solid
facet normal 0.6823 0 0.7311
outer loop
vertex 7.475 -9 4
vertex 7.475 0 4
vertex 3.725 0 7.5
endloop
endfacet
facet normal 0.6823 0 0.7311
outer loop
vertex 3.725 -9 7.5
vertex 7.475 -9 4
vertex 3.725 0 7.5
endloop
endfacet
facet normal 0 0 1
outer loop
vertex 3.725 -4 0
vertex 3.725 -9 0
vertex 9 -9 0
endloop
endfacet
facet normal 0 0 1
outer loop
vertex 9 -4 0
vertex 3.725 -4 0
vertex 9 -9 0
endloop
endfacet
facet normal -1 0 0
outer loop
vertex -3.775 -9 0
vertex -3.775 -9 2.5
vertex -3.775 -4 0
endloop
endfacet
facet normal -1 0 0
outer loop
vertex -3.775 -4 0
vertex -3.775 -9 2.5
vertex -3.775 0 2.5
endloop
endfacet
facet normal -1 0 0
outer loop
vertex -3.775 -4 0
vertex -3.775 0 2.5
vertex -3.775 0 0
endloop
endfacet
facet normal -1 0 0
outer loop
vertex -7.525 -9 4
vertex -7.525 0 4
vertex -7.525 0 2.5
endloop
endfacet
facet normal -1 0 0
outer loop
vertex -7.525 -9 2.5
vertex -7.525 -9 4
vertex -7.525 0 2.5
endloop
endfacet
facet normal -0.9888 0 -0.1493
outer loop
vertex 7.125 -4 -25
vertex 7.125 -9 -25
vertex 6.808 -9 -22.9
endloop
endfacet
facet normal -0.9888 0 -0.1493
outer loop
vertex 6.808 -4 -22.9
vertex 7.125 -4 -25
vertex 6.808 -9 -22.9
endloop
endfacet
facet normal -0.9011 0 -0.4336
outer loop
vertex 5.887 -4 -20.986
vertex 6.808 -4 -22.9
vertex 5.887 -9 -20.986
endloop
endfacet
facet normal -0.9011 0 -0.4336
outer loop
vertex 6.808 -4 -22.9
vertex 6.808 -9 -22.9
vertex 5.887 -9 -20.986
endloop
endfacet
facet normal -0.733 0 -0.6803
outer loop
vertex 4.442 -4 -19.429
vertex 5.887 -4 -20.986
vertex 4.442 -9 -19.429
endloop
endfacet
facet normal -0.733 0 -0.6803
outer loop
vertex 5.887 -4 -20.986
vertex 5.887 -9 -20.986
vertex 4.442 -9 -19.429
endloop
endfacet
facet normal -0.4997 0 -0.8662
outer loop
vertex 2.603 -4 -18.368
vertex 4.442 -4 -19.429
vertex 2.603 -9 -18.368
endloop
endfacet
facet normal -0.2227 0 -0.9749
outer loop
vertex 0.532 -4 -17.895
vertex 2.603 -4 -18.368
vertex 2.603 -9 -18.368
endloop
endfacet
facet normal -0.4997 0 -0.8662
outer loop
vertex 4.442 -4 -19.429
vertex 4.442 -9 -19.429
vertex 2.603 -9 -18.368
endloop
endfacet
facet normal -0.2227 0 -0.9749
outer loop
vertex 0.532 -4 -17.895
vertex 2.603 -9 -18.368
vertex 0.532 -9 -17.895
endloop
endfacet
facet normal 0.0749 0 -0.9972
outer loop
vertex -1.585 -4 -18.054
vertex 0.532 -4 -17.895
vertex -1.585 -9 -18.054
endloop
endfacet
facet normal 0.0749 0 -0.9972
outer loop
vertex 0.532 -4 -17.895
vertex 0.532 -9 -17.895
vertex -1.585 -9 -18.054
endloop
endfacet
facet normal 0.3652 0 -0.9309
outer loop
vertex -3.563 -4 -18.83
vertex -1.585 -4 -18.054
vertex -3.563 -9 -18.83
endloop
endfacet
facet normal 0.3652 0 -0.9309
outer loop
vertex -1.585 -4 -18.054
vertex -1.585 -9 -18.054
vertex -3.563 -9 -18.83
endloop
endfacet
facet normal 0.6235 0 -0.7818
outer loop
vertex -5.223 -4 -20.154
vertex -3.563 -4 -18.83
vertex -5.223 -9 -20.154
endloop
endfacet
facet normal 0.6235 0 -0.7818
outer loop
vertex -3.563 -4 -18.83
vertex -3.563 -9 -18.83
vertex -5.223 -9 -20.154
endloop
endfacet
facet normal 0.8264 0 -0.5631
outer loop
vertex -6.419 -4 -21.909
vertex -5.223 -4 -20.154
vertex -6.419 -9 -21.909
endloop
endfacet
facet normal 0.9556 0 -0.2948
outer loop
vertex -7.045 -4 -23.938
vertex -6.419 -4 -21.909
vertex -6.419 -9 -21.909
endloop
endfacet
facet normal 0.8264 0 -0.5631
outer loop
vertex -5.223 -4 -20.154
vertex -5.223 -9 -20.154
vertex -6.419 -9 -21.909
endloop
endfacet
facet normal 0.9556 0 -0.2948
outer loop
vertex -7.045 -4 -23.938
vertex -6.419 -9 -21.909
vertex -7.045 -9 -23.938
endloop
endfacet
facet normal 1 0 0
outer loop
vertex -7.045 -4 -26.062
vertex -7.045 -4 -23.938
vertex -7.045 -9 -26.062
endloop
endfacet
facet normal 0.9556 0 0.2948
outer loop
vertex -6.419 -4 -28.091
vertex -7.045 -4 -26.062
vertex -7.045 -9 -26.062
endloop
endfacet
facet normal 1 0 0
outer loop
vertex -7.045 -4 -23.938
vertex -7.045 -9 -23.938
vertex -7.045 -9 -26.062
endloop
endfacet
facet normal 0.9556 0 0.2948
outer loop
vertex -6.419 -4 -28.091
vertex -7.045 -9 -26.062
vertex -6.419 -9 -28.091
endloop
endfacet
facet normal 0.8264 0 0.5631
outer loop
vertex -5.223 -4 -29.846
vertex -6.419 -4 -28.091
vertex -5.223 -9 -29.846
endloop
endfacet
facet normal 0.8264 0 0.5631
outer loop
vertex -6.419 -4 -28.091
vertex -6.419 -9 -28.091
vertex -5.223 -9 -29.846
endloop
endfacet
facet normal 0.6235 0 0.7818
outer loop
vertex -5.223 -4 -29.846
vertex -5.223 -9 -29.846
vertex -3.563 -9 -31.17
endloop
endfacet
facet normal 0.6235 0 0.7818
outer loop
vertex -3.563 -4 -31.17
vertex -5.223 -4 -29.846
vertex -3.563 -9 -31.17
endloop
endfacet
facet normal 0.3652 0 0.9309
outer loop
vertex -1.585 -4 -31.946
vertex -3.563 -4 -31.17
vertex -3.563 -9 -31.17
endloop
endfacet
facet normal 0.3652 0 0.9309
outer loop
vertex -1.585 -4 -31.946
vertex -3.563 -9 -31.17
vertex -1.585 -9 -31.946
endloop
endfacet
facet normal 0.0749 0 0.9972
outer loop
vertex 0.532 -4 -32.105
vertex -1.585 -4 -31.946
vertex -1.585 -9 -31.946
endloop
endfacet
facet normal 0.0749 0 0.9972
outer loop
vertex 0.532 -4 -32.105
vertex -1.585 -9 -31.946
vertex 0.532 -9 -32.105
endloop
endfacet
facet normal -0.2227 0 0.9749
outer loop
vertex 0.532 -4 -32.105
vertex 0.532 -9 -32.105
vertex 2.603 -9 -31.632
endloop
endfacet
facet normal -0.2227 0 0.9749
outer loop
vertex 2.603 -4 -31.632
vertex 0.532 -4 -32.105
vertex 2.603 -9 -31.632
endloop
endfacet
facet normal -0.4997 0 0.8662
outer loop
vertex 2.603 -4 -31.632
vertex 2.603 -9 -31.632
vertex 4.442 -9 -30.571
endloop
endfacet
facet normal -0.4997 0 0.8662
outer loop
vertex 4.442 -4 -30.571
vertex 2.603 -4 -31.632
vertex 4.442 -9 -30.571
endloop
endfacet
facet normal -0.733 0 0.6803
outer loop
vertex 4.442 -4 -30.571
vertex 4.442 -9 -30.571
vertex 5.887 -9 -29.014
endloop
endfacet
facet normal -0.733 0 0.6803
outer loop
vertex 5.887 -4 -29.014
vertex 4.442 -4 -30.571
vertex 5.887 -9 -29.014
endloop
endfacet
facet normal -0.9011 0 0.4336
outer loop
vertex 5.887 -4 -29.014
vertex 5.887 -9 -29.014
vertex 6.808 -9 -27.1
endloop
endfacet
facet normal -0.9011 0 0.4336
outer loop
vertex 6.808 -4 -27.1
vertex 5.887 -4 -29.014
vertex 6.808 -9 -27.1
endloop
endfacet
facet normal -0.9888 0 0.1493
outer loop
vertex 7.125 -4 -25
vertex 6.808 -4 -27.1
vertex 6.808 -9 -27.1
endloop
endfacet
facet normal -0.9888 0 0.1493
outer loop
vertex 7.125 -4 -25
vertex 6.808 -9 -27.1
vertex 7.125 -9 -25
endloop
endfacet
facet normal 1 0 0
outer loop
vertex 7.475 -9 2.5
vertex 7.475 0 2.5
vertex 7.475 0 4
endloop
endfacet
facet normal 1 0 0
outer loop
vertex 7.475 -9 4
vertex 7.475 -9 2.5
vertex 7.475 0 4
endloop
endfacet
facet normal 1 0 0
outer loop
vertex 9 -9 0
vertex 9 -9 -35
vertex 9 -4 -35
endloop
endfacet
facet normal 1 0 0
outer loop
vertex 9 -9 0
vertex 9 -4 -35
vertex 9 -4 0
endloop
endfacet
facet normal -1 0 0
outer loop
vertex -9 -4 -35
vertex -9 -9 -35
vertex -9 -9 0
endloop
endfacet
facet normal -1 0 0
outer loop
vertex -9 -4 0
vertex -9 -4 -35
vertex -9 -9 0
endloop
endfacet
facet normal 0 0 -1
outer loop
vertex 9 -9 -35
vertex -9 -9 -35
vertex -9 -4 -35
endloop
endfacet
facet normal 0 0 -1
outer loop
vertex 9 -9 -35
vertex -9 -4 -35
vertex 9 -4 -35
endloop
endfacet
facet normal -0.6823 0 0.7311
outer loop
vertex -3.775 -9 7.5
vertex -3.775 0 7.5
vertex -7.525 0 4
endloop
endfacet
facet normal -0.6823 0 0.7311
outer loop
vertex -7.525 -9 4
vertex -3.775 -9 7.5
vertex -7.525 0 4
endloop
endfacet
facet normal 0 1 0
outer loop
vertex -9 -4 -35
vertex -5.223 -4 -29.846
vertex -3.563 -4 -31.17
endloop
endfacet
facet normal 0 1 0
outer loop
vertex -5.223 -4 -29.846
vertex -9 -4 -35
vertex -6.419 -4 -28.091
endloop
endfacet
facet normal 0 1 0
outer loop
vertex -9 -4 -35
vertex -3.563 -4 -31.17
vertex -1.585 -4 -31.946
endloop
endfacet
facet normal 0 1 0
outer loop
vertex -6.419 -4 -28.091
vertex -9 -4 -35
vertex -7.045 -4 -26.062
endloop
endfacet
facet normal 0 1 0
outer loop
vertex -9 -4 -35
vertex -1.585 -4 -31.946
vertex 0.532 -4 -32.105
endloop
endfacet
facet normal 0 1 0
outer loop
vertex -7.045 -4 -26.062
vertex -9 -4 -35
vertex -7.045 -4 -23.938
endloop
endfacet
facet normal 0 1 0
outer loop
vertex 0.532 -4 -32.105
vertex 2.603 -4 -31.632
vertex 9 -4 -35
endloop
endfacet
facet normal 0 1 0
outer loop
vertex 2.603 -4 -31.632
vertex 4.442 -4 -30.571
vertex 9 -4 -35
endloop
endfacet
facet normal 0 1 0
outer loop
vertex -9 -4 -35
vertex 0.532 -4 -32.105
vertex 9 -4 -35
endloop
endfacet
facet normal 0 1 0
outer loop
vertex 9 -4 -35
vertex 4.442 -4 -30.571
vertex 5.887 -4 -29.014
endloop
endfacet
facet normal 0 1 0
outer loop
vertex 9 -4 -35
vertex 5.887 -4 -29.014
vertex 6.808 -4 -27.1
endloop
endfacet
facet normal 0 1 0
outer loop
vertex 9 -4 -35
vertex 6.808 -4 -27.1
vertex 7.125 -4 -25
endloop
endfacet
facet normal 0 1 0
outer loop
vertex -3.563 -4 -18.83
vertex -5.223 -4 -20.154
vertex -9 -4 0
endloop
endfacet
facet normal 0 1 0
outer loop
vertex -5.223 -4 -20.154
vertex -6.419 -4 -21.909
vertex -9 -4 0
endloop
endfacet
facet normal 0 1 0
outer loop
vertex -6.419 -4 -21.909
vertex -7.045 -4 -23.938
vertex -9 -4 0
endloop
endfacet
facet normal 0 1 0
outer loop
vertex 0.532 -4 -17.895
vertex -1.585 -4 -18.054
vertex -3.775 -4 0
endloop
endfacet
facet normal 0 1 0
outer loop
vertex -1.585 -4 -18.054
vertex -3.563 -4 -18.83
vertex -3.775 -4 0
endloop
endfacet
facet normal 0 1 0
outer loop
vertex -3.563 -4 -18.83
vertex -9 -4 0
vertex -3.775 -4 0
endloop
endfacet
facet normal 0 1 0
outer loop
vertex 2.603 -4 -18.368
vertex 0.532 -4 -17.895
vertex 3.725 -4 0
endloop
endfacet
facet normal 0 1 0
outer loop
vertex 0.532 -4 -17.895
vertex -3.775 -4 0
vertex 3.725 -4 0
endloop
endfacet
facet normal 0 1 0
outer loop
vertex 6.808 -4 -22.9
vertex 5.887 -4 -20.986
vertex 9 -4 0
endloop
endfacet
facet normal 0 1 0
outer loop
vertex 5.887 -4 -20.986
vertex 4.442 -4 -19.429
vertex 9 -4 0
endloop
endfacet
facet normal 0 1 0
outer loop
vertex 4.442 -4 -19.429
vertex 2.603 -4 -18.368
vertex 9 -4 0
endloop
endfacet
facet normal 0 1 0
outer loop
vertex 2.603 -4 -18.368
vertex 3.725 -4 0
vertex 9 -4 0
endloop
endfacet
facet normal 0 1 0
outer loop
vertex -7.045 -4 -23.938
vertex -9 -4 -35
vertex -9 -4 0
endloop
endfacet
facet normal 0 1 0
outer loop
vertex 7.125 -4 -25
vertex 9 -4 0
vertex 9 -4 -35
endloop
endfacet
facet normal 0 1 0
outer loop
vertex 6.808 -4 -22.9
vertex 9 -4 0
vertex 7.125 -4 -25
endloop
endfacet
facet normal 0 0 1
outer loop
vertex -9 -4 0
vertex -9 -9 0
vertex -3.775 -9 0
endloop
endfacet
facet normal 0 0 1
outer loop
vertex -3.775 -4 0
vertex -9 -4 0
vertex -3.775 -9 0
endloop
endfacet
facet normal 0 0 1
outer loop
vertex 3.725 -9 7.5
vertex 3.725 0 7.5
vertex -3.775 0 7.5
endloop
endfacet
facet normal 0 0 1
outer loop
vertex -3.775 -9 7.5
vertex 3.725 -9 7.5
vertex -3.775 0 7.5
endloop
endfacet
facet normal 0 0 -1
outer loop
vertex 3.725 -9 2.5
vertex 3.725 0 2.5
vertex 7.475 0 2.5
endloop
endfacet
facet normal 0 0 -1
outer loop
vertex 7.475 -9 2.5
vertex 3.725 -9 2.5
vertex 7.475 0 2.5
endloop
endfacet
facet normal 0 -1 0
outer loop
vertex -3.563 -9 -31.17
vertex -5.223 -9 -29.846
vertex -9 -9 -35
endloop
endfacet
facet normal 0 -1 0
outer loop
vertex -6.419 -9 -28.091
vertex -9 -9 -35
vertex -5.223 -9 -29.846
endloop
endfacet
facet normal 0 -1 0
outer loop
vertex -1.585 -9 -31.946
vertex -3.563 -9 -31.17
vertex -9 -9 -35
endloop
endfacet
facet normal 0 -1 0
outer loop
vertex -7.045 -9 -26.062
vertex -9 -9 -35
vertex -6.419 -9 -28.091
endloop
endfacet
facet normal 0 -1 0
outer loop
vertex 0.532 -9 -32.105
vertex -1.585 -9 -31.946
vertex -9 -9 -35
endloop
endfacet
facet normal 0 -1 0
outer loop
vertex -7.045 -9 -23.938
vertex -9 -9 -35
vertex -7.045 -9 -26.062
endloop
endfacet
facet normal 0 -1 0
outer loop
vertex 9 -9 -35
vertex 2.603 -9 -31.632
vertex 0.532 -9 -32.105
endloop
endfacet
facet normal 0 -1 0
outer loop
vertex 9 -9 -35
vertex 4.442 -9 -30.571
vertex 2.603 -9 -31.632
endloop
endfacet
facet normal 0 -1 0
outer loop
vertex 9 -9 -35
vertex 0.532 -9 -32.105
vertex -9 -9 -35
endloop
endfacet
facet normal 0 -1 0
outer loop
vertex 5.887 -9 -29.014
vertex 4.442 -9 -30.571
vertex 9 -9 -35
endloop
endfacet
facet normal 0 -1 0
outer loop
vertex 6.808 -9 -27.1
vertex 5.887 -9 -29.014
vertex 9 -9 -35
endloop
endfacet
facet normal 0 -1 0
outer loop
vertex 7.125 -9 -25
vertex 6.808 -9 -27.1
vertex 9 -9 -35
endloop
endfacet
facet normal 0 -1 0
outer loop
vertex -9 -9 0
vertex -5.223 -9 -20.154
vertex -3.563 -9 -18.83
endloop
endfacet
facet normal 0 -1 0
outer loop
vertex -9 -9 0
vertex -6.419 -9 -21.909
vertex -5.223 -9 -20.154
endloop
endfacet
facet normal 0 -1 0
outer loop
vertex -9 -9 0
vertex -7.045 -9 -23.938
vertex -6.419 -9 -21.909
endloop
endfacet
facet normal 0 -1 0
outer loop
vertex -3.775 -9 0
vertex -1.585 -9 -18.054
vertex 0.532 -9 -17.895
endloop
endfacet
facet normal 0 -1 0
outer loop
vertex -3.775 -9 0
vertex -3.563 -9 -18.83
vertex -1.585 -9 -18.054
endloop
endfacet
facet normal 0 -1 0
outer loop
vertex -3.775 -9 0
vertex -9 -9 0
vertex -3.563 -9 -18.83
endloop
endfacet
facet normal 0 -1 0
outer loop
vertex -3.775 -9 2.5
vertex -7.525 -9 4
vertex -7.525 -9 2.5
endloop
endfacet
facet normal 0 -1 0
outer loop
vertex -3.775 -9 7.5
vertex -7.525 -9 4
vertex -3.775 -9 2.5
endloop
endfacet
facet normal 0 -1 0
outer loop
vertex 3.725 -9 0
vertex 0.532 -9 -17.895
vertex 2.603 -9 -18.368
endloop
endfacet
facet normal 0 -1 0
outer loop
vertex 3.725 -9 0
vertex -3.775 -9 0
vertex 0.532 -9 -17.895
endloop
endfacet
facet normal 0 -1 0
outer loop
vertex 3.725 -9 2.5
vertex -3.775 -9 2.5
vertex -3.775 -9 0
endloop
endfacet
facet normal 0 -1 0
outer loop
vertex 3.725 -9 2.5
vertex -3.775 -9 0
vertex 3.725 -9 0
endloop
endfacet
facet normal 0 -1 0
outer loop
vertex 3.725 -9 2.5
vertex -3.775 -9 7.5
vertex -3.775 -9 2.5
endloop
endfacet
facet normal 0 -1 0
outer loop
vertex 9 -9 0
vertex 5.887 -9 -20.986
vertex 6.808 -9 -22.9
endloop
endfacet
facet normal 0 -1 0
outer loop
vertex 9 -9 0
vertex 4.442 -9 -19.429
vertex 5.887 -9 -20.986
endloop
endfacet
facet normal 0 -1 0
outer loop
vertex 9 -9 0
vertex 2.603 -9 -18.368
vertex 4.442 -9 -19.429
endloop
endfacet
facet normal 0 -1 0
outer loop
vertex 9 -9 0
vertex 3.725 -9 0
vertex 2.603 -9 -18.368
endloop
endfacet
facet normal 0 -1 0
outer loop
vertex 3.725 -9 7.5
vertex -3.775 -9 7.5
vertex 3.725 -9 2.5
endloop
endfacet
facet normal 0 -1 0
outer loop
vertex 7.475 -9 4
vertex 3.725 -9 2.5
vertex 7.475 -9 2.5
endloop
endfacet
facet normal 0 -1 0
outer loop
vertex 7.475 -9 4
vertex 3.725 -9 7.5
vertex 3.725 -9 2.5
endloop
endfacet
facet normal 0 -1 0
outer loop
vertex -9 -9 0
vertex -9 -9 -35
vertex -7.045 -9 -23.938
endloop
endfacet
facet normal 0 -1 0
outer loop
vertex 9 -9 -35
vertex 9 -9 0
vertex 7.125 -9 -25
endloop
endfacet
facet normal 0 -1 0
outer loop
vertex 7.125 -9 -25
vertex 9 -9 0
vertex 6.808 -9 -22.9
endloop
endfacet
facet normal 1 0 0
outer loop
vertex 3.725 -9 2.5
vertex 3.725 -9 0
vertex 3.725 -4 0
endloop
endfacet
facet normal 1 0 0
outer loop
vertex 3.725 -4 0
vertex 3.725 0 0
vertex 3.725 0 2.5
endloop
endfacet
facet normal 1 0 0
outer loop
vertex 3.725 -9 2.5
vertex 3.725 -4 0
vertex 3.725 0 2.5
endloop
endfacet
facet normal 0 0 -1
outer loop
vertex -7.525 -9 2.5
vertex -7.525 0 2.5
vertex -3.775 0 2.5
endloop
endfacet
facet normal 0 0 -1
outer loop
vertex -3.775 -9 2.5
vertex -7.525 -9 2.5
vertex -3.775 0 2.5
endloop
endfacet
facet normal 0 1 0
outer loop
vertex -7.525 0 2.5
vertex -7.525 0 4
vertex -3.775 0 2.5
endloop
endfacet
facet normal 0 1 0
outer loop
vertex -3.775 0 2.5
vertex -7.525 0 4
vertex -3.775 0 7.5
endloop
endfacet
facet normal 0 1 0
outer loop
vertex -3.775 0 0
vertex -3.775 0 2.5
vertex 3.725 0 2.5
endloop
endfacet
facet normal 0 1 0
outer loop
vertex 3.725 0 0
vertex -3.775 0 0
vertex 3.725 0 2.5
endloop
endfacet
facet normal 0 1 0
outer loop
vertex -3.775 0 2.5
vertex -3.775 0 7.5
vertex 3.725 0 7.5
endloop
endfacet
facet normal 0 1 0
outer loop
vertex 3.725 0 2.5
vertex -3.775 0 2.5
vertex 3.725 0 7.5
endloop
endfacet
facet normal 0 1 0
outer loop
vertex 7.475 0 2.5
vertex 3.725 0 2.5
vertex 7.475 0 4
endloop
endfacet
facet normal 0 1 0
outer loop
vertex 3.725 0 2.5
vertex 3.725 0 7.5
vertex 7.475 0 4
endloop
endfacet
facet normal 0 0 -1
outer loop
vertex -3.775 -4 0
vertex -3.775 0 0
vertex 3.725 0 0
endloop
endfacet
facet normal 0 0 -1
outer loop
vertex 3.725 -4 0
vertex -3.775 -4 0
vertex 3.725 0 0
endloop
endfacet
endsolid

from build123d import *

# Parameters (mm, degrees)
F1_DEPTH       = 9
F2_W           = 18
F2_H           = 35
F3_DEPTH       = 5
F5_D           = 8.8
F5_DEPTH       = 10
F5_CBORE_D     = 14.25
F5_CBORE_DEPTH = 8
F5_TIP         = 2.6437867237


with BuildPart() as f1:
    # F0 (on Front) → F1 (new body)
    with BuildSketch(Plane.XZ):
        Polygon((-3.7746716016, 2.5), (-3.7746716016, 0), (3.7253283984, 0), (3.7253283984, 2.5), (7.4753283984, 2.5), (7.4753283984, 4), (3.7253283984, 7.5), (-3.7746716016, 7.5), (-7.5246716016, 4), (-7.5246716016, 2.5), align=None)
    extrude(amount=F1_DEPTH)

    # F2 (on face) → F3 (join)
    with BuildSketch(Plane.XZ.offset(9)):
        with Locations((0, -17.5)):
            Rectangle(F2_W, F2_H)
    extrude(amount=-F3_DEPTH)

    # F5
    with Locations(Plane.XZ.offset(9)):
        with Locations((0, -25)):
            CounterBoreHole(F5_D / 2, F5_CBORE_D / 2, F5_CBORE_DEPTH, depth=F5_DEPTH)
            with Locations((0, 0, -(F5_DEPTH + F5_TIP / 2))):  # 118° drill point
                Cone(0, F5_D / 2, F5_TIP, mode=Mode.SUBTRACT)


solid = f1.part
